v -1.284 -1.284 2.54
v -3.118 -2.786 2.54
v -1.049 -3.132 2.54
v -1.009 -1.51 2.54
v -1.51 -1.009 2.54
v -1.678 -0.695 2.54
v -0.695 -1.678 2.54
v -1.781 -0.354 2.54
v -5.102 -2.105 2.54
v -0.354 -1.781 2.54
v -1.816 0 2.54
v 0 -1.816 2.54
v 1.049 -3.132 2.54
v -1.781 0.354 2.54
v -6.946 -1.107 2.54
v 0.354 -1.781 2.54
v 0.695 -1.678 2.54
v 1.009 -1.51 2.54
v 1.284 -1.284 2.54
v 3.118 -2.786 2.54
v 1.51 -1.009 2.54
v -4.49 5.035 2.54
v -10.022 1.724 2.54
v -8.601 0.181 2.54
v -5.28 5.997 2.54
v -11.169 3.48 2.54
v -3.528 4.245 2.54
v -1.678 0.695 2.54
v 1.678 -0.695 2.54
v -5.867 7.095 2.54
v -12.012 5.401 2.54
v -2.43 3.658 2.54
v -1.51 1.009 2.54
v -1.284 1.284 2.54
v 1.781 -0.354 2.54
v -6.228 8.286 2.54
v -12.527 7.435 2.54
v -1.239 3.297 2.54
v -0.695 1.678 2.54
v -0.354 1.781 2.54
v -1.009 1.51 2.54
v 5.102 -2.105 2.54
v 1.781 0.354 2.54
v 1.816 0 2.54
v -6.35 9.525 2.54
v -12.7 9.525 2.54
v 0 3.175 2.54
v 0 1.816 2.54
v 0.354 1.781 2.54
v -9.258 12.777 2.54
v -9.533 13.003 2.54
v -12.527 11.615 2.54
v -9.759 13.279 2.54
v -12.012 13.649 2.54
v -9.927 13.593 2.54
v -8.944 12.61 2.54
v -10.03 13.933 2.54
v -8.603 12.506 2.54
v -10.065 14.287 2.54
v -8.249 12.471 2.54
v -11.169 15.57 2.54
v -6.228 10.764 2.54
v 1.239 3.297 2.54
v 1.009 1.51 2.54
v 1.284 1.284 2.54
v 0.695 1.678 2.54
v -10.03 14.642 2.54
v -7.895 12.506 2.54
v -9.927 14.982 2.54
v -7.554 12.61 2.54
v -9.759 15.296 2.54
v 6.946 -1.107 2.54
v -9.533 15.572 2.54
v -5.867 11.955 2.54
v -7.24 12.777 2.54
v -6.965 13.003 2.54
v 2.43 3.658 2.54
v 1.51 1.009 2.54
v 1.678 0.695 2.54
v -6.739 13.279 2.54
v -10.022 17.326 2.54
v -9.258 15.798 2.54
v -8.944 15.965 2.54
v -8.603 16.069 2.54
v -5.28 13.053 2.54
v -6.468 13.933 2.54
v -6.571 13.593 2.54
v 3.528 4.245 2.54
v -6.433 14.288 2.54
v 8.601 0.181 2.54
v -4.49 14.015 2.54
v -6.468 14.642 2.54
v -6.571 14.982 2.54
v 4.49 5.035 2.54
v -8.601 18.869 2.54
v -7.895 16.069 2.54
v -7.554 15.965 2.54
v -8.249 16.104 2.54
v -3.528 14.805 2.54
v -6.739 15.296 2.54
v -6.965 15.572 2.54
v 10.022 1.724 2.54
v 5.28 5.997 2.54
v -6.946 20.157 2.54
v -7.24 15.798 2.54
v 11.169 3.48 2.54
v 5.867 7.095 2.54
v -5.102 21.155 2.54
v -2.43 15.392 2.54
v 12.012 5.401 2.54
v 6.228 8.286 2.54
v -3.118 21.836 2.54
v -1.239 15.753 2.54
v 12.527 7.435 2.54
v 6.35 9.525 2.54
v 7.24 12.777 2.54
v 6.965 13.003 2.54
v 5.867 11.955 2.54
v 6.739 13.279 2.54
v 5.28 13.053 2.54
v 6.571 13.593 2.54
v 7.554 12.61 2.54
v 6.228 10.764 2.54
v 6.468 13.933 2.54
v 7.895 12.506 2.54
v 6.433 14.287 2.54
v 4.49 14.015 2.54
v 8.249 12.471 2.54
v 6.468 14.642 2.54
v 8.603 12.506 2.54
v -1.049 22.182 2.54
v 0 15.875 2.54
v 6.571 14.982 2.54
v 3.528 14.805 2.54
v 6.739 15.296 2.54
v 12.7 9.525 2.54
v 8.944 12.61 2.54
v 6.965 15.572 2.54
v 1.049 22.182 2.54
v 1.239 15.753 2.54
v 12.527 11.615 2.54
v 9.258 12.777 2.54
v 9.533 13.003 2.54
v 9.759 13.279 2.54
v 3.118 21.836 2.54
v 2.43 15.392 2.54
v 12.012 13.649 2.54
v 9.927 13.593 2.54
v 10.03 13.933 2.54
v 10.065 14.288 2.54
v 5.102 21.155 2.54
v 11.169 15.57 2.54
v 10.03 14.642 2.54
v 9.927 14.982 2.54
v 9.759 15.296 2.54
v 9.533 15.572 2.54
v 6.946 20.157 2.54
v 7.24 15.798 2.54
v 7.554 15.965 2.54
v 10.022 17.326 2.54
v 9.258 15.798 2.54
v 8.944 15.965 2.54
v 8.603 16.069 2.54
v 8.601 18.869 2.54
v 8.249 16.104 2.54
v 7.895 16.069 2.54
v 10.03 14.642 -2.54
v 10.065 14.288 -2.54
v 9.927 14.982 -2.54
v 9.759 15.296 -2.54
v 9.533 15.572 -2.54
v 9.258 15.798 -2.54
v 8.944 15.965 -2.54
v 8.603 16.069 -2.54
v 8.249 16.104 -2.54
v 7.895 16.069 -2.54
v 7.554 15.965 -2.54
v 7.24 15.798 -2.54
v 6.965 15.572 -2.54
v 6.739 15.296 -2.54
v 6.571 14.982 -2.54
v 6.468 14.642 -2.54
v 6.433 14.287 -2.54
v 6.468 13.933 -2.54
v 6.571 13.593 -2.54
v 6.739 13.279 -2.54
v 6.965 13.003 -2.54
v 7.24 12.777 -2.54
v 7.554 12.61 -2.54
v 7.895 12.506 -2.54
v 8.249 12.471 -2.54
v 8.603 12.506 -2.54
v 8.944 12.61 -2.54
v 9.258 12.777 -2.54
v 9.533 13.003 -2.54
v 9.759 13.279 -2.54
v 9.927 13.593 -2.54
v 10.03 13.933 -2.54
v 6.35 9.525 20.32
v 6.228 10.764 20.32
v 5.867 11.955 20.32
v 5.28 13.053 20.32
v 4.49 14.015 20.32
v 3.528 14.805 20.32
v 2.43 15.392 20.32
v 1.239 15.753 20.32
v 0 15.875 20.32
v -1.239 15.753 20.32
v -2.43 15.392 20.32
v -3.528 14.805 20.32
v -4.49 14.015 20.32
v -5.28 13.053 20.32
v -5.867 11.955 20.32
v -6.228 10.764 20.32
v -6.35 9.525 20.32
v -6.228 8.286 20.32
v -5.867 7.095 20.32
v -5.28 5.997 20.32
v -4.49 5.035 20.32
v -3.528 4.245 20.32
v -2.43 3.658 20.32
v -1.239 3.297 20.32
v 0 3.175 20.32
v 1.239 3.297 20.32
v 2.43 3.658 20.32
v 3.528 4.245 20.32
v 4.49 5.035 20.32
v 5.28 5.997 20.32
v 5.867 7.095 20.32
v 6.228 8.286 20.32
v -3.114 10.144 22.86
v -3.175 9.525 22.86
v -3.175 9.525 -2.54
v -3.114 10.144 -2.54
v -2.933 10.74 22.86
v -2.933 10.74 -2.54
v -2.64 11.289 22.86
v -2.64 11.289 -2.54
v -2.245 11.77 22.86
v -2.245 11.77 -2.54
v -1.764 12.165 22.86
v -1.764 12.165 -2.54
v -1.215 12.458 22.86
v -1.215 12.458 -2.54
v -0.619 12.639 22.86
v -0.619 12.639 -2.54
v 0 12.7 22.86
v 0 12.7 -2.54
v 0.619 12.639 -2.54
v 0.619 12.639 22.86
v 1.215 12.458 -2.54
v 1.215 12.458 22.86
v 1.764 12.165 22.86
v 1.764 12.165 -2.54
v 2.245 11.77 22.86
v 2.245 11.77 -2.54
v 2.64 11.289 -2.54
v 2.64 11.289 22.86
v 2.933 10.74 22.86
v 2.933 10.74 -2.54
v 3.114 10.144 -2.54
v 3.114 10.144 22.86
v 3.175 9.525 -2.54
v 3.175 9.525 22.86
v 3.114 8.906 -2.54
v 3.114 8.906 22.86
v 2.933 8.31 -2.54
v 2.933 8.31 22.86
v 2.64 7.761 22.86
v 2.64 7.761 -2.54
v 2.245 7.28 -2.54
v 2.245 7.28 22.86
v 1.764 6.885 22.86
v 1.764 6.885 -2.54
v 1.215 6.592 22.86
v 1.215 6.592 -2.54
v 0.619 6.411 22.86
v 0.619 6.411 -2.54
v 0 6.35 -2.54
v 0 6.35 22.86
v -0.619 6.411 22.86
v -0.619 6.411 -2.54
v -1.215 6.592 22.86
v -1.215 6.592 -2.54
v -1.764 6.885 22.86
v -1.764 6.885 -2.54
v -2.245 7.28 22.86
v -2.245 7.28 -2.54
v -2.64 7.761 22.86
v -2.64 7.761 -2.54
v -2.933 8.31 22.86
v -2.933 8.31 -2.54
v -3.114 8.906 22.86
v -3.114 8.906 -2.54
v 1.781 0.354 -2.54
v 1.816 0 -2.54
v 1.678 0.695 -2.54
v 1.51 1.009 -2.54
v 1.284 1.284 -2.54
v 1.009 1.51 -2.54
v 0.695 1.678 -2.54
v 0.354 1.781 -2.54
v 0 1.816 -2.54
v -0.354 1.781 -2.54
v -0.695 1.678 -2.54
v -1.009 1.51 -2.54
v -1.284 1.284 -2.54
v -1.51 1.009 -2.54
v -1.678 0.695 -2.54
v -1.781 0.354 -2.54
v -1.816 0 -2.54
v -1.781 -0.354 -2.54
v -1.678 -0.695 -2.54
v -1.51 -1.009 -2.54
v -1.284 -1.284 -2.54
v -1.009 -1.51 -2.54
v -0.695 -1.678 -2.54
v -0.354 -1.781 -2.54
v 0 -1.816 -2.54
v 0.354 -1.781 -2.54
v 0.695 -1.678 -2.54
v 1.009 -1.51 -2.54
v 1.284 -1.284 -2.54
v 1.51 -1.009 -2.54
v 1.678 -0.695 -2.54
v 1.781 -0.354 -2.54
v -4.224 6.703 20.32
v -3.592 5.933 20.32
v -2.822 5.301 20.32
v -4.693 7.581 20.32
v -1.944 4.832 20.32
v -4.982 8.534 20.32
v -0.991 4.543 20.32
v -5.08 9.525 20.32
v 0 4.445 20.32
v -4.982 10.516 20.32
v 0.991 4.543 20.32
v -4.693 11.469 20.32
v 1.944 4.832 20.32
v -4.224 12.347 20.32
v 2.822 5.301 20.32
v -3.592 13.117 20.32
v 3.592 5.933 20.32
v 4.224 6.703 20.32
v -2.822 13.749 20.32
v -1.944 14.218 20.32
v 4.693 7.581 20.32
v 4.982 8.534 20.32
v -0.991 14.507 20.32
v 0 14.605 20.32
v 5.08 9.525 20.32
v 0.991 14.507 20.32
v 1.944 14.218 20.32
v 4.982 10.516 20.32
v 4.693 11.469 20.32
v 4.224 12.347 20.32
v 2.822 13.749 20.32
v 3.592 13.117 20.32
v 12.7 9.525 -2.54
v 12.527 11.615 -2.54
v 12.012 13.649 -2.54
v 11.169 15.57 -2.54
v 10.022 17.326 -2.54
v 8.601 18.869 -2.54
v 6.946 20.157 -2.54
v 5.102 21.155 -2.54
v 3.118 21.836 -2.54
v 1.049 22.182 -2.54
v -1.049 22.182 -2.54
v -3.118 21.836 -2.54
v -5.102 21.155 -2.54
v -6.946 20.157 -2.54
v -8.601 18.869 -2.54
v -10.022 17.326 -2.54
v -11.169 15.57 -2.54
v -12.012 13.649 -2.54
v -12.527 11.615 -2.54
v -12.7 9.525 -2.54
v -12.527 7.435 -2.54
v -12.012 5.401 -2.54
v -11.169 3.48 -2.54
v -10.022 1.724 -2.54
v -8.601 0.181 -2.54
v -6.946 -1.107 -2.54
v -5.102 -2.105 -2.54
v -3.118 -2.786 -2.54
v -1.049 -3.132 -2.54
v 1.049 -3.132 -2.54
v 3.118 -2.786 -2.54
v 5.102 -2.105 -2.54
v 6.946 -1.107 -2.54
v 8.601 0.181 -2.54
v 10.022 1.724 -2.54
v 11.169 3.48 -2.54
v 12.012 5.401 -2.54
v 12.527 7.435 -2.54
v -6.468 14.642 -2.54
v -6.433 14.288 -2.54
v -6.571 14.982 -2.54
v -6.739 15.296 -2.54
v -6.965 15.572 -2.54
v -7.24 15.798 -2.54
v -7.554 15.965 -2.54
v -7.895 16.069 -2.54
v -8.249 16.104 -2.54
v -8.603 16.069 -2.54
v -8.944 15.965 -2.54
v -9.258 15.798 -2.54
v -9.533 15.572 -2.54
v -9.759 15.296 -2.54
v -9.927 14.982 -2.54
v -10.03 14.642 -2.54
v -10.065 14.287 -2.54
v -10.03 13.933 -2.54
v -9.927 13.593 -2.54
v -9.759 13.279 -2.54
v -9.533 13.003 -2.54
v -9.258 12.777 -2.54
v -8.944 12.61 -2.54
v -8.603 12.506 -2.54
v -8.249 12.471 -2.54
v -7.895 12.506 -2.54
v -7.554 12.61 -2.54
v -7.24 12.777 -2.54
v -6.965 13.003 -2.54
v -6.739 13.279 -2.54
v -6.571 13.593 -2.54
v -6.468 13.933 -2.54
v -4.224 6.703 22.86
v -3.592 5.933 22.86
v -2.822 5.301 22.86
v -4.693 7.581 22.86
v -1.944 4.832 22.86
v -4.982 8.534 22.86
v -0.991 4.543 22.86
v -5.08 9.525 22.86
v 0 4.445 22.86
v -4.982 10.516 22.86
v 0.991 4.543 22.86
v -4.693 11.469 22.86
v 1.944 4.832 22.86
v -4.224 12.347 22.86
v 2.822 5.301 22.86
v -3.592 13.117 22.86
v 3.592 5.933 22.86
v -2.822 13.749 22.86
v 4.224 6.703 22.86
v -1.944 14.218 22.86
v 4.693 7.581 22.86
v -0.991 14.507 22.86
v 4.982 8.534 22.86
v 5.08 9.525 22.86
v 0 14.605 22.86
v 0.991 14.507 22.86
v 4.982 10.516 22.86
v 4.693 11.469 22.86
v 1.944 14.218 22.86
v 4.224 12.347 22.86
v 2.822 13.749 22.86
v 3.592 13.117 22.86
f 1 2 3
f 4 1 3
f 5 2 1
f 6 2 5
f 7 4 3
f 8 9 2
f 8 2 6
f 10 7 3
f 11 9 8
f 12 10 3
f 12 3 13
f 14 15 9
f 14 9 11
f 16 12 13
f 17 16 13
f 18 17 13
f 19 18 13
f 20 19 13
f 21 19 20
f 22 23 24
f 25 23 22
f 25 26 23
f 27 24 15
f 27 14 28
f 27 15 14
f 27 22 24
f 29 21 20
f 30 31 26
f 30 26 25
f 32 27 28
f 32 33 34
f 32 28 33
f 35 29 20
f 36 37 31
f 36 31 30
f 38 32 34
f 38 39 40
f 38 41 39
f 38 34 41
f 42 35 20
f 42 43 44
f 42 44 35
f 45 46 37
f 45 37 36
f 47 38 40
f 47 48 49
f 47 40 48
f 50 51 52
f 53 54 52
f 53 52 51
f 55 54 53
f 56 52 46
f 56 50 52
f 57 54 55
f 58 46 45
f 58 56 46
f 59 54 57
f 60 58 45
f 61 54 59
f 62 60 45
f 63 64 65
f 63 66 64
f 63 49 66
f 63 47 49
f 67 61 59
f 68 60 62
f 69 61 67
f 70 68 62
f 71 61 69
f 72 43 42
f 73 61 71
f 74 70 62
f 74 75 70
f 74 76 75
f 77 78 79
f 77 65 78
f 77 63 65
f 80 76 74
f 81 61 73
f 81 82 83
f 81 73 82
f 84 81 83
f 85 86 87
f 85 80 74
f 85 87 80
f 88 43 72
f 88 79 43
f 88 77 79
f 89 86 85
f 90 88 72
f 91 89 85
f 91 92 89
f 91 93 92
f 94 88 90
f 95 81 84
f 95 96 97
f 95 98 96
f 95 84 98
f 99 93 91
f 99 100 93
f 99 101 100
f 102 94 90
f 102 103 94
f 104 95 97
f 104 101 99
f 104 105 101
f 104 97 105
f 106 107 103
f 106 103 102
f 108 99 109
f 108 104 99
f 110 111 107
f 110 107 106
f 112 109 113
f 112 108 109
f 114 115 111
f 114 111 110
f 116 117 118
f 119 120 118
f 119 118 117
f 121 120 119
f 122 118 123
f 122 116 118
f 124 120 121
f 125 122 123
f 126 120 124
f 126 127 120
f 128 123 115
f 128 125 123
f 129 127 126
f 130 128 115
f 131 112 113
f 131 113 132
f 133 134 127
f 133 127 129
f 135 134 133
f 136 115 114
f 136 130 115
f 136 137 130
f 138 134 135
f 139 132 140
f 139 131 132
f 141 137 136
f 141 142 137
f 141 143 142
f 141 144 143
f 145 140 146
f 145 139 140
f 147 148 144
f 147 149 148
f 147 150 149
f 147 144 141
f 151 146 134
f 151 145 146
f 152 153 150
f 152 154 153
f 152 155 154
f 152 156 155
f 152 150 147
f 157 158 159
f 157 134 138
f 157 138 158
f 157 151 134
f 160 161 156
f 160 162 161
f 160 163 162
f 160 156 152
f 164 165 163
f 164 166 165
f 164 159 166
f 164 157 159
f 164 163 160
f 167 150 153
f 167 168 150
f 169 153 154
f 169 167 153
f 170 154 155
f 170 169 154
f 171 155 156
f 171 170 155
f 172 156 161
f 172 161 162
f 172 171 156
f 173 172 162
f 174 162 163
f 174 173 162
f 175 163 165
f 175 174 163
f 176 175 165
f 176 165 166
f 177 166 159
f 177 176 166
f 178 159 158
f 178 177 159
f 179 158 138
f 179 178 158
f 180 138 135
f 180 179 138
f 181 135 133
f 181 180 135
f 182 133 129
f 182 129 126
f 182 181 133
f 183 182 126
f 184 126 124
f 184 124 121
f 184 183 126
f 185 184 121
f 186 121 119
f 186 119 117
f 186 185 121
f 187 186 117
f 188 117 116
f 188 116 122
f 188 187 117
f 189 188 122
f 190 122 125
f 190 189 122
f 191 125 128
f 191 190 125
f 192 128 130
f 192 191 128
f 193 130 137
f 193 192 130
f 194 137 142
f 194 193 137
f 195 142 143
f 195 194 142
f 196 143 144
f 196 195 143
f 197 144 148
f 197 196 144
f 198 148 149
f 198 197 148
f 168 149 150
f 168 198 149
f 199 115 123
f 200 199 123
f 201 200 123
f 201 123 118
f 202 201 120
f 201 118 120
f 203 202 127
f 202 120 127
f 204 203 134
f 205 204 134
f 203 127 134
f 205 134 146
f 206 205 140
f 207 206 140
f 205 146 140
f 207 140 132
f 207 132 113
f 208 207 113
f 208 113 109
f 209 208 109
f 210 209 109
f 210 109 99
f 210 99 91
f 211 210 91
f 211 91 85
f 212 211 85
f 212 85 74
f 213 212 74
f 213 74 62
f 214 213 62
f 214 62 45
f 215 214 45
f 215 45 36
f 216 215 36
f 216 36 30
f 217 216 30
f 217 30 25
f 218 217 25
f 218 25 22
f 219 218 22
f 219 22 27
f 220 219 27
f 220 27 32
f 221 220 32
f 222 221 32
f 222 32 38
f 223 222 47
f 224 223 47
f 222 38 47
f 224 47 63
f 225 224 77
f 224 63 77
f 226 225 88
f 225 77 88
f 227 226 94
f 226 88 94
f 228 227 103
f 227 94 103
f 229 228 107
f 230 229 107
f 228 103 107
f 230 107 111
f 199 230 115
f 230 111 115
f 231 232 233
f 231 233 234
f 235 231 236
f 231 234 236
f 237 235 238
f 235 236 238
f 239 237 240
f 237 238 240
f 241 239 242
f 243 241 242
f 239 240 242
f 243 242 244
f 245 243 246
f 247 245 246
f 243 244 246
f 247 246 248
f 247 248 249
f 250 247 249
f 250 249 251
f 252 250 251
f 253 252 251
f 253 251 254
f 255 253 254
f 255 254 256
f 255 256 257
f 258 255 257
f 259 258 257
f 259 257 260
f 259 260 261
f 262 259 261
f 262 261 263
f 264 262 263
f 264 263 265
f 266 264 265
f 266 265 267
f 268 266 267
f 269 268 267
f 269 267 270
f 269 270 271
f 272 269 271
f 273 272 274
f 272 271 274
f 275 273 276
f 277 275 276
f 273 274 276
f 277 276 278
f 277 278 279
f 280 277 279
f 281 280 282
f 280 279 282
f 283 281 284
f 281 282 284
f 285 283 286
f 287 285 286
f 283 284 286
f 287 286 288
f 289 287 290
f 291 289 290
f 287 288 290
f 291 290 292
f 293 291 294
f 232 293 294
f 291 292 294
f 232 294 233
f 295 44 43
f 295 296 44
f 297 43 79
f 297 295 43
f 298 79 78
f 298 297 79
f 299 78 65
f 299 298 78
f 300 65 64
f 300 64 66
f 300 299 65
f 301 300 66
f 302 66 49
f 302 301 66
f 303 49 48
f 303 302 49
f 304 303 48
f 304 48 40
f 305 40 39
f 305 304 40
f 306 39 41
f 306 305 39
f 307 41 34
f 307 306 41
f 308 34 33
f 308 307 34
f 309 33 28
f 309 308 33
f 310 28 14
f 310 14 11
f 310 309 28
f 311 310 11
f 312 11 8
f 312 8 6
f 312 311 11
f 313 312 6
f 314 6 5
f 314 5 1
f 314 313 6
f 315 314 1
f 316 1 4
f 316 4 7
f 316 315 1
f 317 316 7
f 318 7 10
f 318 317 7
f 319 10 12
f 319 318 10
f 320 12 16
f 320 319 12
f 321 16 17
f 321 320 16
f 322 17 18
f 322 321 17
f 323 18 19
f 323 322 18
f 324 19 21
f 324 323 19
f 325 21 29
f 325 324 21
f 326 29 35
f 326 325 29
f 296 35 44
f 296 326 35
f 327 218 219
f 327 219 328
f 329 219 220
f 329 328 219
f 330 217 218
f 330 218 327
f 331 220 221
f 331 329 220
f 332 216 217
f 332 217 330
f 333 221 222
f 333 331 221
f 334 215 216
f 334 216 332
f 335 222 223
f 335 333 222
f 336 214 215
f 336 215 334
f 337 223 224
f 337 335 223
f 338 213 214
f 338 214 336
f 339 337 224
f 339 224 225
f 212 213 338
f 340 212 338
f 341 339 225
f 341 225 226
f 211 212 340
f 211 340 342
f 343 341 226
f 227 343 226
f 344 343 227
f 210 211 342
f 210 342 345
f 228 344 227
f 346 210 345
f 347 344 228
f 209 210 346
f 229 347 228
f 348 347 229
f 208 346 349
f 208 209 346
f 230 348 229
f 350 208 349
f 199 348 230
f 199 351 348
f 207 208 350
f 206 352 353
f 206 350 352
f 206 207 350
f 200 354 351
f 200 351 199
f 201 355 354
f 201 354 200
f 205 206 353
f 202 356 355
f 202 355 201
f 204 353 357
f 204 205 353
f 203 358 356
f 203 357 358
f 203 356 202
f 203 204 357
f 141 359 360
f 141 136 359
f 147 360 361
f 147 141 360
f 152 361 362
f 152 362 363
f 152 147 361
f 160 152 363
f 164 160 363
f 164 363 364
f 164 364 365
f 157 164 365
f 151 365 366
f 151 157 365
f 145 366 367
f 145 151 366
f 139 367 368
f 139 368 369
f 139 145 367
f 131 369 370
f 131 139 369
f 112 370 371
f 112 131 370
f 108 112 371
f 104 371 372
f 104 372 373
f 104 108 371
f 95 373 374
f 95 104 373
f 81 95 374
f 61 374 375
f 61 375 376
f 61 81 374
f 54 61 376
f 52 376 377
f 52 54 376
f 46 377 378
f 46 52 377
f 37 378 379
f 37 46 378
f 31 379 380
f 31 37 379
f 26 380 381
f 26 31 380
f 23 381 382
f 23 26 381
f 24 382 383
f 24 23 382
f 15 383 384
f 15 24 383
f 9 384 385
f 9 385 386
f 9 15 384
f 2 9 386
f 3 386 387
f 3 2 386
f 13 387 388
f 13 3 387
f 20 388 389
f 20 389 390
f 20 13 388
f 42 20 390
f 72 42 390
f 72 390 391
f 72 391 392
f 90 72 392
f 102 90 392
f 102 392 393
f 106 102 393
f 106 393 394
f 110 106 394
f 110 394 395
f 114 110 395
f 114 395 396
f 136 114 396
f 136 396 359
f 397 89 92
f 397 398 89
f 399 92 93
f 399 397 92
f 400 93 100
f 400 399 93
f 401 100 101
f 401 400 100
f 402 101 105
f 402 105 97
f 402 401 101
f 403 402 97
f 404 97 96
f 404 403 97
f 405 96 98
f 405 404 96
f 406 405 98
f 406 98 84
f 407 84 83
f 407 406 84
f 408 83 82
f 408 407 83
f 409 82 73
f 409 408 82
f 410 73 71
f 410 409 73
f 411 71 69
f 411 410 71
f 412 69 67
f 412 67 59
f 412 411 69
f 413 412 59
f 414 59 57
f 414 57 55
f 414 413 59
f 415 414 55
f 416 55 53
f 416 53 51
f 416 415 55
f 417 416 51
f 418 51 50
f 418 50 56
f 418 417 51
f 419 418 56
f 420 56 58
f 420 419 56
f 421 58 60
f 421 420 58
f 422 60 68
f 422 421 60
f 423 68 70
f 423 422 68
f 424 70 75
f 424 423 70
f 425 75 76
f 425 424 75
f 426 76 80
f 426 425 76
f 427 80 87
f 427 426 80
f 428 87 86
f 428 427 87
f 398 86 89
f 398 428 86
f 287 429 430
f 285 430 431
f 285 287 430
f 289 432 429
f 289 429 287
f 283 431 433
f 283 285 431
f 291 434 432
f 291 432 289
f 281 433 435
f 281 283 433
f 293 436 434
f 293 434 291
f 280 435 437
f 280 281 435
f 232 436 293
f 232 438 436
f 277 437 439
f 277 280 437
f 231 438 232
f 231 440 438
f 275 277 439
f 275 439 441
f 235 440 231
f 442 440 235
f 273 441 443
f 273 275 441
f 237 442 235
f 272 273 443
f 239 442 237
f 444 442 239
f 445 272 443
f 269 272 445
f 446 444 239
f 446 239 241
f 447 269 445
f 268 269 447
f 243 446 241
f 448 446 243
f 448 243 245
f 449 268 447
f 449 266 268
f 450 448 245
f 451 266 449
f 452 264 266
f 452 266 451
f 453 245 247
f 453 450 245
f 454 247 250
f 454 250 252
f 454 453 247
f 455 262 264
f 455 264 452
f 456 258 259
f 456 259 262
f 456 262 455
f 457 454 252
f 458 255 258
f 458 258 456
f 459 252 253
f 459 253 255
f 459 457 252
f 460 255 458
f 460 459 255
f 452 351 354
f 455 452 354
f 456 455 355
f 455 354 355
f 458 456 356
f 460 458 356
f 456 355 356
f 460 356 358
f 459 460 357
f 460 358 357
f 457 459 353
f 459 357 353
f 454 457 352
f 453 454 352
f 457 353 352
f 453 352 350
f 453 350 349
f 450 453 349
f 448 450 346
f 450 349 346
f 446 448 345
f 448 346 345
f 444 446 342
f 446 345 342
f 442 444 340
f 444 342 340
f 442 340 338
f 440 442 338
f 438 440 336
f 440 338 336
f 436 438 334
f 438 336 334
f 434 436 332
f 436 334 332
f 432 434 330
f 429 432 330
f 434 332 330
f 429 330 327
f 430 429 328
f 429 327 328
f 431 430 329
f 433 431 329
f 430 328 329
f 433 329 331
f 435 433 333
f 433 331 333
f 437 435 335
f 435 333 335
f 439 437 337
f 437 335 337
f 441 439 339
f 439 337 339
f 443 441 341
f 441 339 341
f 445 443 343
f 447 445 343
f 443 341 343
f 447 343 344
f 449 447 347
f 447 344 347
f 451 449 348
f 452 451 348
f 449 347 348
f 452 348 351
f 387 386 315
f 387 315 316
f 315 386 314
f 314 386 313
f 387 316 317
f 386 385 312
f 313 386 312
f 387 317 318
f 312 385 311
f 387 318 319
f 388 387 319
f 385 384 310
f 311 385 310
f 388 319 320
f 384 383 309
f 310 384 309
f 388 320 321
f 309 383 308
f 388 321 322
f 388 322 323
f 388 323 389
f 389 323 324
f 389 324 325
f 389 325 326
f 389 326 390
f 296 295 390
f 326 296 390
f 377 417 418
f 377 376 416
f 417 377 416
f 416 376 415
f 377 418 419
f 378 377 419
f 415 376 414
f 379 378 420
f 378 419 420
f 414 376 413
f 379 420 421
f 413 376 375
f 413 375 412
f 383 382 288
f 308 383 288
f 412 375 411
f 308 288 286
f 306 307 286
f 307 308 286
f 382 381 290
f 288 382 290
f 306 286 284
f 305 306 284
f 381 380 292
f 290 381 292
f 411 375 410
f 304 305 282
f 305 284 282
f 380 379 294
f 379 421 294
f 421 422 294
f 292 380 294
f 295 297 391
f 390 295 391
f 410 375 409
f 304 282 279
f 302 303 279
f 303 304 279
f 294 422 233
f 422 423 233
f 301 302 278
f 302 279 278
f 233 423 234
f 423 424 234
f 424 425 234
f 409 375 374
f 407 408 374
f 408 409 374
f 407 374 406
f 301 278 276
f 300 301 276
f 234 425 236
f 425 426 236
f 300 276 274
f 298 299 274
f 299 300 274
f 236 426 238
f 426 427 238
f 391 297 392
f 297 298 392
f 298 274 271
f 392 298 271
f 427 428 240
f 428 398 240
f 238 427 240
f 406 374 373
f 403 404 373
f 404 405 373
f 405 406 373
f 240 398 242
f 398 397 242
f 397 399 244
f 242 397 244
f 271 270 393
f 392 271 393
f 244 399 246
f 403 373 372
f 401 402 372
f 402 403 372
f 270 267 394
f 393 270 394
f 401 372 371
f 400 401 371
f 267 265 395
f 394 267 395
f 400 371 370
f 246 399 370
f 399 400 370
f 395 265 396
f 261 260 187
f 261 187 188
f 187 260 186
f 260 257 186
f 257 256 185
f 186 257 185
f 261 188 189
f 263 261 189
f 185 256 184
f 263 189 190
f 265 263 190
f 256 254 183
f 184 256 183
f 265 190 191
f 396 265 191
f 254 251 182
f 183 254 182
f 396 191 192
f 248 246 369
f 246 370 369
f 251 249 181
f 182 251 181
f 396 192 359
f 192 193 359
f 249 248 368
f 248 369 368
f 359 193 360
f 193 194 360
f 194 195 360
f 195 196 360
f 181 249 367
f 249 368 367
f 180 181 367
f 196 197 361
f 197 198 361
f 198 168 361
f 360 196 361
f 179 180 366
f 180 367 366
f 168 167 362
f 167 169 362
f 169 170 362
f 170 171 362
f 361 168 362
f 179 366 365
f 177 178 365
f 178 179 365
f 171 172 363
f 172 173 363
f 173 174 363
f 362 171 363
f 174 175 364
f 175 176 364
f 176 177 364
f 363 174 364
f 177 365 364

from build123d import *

# Parameters (mm, degrees)
SKETCH1_R           = 12.7
SKETCH1_R_2         = 1.8161
BOSS_EXTRUDE1_DEPTH = 2.54
SKETCH2_R           = 6.35
BOSS_EXTRUDE2_DEPTH = 20.32
SKETCH4_R           = 3.175
CUT_EXTRUDE1_DEPTH  = 37.061067996
CUT_EXTRUDE2_START  = -2.54
SKETCH5_R           = 6.35
SKETCH5_R_2         = 5.08
CUT_EXTRUDE2_DEPTH  = 2.54


with BuildPart() as part:
    # Sketch1 → Boss-Extrude1 (new, symmetric)
    with BuildSketch(Plane.XY):
        with Locations((0, 9.525)):
            Circle(SKETCH1_R)
        Circle(SKETCH1_R_2, mode=Mode.SUBTRACT)
        with Locations((-8.248891971, 14.2875)):
            Circle(SKETCH1_R_2, mode=Mode.SUBTRACT)
        with Locations((8.248891971, 14.2875)):
            Circle(SKETCH1_R_2, mode=Mode.SUBTRACT)
    extrude(amount=BOSS_EXTRUDE1_DEPTH, both=True)

    # Sketch2 → Boss-Extrude2 (add)
    with BuildSketch(Plane.XY.offset(2.54)):
        with Locations((0, 9.525)):
            Circle(SKETCH2_R)
    extrude(amount=BOSS_EXTRUDE2_DEPTH)

    # Sketch4 → Cut-Extrude1 (cut, through all)
    with BuildSketch(Plane(origin=(0, 0, -2.54), x_dir=(-1, 0, 0), z_dir=(0, 0, -1))):
        with Locations((0, 9.525)):
            Circle(SKETCH4_R)
    extrude(amount=-CUT_EXTRUDE1_DEPTH, mode=Mode.SUBTRACT)

    # Sketch5 → Cut-Extrude2 (cut)
    with BuildSketch(Plane.XY.offset(22.86).offset(CUT_EXTRUDE2_START)):
        with Locations((0, 9.525)):
            Circle(SKETCH5_R)
        with Locations((0, 9.525)):
            Circle(SKETCH5_R_2, mode=Mode.SUBTRACT)
    extrude(amount=CUT_EXTRUDE2_DEPTH, mode=Mode.SUBTRACT)


solid = part.part
